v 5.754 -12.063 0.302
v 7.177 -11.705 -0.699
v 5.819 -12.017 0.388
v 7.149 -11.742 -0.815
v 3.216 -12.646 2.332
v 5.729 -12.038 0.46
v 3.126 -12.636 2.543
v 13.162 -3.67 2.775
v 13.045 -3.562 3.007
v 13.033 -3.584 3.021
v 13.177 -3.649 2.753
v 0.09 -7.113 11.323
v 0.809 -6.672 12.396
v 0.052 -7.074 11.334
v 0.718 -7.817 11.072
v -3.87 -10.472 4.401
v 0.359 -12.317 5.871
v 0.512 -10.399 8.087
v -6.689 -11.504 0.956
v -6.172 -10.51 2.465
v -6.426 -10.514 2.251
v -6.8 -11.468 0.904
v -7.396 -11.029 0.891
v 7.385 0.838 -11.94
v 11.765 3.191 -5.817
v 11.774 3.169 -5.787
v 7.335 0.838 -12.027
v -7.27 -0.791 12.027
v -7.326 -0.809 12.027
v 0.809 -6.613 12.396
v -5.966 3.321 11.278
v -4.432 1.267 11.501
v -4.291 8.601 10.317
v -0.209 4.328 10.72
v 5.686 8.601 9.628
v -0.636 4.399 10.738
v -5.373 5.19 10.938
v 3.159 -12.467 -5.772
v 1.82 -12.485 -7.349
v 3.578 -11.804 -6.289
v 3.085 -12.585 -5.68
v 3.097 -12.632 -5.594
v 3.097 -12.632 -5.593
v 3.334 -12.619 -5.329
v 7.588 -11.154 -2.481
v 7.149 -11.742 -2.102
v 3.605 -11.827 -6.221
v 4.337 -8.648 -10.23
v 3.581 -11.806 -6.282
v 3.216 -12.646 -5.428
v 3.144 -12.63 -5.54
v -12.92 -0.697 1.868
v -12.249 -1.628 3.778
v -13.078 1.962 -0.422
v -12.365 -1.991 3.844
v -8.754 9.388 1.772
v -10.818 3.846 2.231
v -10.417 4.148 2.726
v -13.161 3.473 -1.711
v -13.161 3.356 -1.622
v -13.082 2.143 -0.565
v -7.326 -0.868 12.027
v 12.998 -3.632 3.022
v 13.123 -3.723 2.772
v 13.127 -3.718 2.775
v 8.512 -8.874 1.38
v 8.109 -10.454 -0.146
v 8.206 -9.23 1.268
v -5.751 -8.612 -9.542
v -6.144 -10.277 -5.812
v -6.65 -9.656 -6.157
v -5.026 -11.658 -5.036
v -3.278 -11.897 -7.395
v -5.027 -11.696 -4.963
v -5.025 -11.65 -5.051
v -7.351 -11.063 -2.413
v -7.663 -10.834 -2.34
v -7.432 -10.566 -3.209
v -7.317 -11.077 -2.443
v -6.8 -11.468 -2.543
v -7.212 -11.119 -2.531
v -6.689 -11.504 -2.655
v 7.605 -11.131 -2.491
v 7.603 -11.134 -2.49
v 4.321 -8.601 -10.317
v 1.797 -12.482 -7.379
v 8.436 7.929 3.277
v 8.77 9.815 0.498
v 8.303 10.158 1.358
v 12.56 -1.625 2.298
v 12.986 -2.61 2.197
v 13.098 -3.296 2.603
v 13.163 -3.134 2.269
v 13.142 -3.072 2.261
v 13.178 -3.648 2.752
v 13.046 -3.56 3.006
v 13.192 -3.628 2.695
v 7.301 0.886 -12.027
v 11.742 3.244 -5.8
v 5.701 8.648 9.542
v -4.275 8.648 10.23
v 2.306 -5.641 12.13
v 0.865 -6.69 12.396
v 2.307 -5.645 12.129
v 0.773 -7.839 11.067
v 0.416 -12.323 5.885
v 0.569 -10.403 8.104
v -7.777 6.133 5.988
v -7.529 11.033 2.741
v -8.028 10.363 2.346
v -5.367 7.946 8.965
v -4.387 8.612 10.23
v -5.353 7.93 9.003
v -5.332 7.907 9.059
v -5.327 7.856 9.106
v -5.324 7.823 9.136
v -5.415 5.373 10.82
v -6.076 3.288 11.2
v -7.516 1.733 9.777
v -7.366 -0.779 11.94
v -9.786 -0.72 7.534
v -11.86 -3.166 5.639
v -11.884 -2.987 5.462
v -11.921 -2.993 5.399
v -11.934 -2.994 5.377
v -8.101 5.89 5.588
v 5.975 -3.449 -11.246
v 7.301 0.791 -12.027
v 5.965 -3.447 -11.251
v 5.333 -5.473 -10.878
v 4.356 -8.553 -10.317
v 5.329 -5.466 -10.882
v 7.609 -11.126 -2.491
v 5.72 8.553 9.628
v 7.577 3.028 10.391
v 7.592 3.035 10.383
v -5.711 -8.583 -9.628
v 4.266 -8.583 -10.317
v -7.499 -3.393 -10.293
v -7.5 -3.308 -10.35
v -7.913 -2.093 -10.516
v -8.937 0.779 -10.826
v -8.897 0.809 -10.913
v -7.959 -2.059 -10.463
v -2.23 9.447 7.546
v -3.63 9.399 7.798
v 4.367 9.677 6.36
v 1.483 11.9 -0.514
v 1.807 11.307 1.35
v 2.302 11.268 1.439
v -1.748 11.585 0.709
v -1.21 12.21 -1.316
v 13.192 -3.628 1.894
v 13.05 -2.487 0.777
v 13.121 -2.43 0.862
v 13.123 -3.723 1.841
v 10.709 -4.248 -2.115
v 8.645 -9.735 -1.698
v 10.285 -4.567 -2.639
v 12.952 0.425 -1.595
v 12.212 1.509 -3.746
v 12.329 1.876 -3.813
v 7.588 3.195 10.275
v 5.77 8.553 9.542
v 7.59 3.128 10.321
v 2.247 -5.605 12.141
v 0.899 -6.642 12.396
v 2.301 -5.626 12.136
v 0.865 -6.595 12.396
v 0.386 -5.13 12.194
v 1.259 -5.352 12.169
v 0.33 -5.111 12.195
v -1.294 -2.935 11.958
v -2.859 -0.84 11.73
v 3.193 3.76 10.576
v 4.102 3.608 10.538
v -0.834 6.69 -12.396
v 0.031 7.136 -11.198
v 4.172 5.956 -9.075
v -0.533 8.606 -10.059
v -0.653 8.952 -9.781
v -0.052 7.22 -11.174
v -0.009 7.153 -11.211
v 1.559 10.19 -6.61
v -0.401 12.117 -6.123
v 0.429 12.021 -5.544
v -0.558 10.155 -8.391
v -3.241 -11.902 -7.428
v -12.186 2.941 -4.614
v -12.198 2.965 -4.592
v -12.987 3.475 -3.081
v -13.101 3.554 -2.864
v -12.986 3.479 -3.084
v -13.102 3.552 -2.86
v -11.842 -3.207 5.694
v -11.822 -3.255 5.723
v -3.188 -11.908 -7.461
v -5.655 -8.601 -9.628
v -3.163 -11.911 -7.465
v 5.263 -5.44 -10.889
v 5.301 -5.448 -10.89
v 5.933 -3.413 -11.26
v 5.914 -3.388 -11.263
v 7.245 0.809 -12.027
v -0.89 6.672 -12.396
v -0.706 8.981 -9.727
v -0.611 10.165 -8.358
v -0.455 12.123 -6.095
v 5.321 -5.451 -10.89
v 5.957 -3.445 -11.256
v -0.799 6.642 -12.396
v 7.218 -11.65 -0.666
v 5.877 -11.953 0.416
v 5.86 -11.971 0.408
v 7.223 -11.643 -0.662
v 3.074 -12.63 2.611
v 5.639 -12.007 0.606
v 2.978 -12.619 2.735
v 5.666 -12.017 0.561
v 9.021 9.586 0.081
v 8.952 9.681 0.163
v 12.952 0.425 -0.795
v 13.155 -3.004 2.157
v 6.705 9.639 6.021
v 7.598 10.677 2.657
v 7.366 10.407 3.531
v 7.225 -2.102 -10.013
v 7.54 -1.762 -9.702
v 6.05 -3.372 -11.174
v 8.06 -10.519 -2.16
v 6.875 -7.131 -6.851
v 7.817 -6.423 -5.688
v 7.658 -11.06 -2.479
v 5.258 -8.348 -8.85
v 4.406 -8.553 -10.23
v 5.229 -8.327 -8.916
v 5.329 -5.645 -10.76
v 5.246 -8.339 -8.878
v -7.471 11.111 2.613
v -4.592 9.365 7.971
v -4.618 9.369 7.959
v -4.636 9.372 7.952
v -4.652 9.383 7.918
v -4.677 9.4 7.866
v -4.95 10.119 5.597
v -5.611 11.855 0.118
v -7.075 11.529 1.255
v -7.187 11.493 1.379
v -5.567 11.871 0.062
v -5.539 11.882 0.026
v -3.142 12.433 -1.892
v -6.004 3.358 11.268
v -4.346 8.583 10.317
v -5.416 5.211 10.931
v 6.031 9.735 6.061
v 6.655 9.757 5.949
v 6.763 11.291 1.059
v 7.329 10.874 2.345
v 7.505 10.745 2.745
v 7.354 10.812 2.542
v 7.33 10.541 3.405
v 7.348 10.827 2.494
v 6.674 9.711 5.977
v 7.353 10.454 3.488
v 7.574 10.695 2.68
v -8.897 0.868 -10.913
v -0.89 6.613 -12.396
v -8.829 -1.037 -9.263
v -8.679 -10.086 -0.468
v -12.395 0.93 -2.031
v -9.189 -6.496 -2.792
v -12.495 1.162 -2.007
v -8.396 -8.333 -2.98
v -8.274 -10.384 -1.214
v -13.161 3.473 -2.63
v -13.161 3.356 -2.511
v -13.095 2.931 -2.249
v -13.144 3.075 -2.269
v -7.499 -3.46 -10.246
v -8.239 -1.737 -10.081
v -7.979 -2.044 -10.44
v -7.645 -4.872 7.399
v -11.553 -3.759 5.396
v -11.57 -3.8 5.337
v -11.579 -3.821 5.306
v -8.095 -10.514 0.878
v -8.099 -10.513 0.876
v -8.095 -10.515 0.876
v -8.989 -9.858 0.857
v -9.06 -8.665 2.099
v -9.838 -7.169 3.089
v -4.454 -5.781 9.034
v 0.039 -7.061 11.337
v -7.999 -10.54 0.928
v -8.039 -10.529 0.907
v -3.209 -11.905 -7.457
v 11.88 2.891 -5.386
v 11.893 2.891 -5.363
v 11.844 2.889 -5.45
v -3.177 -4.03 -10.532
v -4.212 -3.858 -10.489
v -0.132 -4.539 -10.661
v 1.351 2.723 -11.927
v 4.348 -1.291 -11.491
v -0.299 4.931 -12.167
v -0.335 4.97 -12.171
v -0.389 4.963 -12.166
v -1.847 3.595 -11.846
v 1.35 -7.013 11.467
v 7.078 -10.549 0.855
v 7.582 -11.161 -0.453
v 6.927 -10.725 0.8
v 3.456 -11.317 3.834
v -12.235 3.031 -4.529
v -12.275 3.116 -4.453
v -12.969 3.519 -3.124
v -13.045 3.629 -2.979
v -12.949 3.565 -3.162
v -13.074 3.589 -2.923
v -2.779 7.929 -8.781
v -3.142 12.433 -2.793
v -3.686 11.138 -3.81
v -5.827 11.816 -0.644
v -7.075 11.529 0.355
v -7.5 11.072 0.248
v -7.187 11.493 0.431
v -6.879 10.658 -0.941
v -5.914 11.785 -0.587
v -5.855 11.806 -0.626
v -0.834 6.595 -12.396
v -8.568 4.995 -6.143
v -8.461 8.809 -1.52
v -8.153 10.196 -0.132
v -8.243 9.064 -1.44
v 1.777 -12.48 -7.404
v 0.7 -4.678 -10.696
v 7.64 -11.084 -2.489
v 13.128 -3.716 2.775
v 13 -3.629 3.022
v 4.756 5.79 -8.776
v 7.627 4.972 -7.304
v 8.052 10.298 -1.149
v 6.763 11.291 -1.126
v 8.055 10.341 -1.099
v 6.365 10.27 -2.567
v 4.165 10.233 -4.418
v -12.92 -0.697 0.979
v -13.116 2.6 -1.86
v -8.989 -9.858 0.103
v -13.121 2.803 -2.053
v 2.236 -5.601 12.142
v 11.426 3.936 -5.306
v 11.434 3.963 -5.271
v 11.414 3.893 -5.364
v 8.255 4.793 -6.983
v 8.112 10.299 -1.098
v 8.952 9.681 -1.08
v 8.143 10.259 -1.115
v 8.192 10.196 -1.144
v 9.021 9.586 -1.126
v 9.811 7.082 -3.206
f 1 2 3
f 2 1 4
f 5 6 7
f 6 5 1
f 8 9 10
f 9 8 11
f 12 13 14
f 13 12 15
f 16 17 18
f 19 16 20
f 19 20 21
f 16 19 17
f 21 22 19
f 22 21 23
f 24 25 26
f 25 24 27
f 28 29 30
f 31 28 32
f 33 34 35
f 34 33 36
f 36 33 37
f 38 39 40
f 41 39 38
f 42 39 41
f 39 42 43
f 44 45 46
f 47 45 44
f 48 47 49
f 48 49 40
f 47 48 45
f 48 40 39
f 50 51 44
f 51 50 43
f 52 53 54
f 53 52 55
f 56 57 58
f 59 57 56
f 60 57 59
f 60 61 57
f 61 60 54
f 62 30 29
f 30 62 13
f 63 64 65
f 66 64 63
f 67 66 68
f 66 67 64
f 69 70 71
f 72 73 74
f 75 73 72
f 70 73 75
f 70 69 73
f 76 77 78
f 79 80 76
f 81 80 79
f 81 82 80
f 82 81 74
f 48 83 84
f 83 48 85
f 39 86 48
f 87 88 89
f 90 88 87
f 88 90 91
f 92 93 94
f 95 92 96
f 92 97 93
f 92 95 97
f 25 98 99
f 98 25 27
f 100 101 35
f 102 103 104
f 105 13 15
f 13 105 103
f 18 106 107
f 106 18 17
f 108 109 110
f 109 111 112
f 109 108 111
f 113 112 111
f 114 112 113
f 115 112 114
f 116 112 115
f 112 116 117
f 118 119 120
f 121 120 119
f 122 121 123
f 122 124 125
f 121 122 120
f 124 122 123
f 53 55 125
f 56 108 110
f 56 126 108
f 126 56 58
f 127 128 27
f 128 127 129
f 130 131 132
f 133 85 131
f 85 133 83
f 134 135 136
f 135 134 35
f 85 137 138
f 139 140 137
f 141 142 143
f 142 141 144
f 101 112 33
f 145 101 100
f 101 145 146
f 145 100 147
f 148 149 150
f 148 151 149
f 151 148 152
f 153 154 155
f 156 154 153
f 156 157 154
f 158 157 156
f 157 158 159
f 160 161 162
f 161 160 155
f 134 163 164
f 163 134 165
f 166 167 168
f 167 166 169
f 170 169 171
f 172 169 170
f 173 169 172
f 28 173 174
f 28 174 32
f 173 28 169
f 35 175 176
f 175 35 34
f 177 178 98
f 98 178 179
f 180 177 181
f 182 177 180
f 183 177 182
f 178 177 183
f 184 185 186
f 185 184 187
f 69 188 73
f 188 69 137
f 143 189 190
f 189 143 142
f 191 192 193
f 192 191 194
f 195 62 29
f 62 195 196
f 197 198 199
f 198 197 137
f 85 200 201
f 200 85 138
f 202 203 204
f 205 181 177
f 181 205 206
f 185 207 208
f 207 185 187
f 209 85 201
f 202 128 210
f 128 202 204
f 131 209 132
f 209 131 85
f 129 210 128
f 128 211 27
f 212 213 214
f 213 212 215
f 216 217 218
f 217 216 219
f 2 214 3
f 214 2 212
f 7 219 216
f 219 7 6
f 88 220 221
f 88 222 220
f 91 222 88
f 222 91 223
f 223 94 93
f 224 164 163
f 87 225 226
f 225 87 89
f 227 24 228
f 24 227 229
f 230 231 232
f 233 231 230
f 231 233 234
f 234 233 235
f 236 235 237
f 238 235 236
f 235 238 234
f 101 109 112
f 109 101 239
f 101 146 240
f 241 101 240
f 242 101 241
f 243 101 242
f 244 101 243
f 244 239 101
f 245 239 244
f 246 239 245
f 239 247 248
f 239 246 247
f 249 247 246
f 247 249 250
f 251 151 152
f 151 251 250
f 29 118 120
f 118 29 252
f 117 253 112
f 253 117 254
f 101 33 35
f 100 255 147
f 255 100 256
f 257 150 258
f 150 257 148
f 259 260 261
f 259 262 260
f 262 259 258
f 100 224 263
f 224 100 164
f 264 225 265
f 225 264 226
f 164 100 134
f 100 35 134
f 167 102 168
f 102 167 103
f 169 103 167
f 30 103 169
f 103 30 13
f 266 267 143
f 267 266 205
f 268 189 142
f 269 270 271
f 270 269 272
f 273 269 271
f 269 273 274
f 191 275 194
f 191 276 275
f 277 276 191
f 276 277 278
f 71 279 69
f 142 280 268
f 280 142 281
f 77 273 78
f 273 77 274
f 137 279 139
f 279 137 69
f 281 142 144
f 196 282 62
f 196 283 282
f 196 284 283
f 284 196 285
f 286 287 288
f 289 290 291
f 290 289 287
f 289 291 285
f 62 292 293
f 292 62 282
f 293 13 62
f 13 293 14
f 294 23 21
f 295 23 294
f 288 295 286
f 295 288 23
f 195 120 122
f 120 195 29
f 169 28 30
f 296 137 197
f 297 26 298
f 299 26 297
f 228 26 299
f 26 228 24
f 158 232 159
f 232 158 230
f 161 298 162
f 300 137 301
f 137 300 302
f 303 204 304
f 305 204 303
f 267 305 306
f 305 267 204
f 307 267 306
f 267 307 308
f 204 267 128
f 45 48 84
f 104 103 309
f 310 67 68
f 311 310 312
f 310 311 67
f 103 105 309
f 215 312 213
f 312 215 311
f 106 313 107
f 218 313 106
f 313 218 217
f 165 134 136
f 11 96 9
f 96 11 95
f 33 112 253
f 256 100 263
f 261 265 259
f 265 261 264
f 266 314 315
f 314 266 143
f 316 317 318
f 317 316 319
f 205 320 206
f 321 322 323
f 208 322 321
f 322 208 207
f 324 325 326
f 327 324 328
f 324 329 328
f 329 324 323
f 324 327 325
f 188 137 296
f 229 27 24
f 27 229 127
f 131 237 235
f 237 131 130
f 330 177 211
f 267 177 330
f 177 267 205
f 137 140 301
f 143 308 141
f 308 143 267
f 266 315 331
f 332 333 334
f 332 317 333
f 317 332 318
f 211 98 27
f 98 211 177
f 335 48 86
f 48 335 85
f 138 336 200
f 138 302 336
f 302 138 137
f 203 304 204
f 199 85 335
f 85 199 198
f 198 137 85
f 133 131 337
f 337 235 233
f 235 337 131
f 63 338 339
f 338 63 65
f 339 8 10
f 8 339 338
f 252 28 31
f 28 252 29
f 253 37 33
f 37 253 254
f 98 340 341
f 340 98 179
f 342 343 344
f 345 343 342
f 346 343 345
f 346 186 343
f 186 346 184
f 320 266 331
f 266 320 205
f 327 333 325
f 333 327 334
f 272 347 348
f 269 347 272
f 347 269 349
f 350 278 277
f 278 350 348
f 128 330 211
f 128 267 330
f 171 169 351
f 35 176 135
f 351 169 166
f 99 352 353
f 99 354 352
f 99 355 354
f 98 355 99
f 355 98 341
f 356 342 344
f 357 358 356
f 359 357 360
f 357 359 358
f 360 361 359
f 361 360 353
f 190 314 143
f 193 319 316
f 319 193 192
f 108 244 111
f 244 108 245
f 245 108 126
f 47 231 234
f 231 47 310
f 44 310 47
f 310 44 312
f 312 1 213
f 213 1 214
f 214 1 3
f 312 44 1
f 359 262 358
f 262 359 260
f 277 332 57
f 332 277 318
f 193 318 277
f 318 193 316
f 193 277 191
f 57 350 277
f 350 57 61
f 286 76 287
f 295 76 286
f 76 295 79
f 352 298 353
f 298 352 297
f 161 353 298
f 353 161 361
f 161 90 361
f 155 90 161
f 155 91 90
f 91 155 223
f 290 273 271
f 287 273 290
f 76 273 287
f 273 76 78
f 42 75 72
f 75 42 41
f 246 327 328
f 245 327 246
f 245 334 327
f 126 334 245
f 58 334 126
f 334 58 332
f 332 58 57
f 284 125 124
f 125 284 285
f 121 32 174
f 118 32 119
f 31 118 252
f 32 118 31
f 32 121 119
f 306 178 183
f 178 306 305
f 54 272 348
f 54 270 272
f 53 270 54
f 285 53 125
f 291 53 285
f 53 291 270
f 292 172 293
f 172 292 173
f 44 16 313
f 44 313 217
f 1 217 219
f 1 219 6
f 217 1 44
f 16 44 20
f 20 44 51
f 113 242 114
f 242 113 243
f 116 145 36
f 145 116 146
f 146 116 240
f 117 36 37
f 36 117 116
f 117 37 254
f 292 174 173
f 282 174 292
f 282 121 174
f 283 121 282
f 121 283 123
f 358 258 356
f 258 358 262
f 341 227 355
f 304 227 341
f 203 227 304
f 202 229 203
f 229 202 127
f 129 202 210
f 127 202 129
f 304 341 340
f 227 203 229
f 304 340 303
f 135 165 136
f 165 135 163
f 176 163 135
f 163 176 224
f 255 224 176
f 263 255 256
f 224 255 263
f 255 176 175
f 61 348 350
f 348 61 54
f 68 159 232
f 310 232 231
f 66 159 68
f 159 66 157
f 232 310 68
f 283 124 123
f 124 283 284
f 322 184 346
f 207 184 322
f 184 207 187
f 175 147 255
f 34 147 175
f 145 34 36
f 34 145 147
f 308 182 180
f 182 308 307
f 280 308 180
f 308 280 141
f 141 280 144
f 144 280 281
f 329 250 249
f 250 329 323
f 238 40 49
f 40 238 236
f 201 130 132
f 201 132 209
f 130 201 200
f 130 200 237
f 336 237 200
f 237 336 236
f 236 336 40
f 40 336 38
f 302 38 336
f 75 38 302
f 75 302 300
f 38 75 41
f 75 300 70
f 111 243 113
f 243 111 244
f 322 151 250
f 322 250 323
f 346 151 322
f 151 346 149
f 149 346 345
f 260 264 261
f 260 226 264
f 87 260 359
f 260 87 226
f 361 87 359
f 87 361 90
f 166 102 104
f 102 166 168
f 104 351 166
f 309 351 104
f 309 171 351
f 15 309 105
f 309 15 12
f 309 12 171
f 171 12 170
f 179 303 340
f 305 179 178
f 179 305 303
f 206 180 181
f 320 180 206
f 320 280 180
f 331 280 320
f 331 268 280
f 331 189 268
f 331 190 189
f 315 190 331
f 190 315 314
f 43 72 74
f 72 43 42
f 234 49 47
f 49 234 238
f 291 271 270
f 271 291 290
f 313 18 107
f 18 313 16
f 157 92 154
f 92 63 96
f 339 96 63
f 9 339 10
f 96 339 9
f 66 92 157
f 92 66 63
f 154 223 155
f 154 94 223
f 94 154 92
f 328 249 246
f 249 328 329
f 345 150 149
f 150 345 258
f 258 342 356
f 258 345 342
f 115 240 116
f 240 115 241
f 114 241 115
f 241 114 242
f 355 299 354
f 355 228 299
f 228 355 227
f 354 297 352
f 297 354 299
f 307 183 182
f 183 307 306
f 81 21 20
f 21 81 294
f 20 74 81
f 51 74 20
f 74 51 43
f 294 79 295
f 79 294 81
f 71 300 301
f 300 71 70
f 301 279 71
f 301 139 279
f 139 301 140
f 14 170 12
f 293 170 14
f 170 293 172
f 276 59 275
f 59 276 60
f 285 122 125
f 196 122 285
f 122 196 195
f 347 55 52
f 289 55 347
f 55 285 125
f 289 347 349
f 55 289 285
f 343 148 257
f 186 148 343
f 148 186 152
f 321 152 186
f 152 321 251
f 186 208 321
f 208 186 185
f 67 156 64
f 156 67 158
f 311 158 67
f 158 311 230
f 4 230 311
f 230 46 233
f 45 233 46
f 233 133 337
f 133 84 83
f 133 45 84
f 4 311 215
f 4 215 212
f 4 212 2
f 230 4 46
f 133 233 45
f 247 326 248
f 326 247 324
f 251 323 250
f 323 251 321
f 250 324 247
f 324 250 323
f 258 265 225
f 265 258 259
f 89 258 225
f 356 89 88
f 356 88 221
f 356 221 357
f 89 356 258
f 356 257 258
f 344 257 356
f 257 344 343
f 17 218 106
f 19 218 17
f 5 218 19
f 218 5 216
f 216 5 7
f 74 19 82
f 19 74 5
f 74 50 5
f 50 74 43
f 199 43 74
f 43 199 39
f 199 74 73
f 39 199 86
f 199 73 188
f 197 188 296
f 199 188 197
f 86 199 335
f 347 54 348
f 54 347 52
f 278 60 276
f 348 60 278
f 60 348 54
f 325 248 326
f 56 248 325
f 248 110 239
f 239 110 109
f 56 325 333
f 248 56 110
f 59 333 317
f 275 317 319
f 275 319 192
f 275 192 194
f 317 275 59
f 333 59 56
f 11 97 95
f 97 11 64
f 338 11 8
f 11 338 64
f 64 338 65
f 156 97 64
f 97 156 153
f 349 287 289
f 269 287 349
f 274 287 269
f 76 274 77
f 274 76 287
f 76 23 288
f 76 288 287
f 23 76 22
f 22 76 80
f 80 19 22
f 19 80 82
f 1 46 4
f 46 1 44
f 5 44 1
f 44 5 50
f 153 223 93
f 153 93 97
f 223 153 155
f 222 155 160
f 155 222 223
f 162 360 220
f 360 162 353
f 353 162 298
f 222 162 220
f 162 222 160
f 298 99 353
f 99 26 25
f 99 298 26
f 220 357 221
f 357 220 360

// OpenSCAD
// Auto-generated OpenSCAD file

    inner_points = 10*[[0.0998930354475761, -0.08761839771919257, 1.3956184279718415], [0.6728697039772034, -0.5090233371692008, -1.1239485150914914], [-0.6716026362296299, 0.487698807845633, 1.1239485150914914], [-0.0986259677000027, 0.06629386839562477, -1.3956184279718415], [-0.8908119004872508, -0.979928839088502, 0.47892884316814505], [-0.6719542878696155, -1.1408912029313139, -0.48346009215137703], [0.673221355617189, 1.1195666736077459, 0.48346009215137703], [0.8920789682348242, 0.9586043097649343, -0.47892884316814505], [0.7118307070376008, -1.1647302272134858, 0.35475514127068664], [-1.3079711835867545, 0.3414697712678377, -0.35648592437079285], [1.3092382513343277, -0.36279430059140544, 0.35648592437079285], [-0.7105636392900273, 1.1434056978899179, -0.35475514127068664], [-0.035585740512491165, -0.9946621663535183, 0.9969743473109073], [0.3185333153995008, -1.2551047419607149, -0.5602036604329037], [-1.28389195945964, -0.06377937343702057, 0.5574031945497779], [-0.9297729035476481, -0.3242219490442169, -0.999774813194033], [0.9310399712952215, 0.30289741972064915, 0.999774813194033], [1.2851590272072133, 0.04245484411345278, -0.5574031945497779], [-0.31726624765192735, 1.2337802126371469, 0.5602036604329037], [0.03685280826006457, 0.9733376370299506, -0.9969743473109073], [0.8878158417756826, -0.674182307300777, 1.208213968994985]];

    outer_points = 10*[[0.03282366802055475, -1.3176403726430708, 0.4756805091246931], [-0.08493614308928757, 0.6642367211098263, -1.2308943583788188], [0.08493614308928757, -0.6642367211098263, 1.2308943583788188], [-0.03282366802055475, 1.3176403726430708, -0.4756805091246931], [-1.283421516714085, -0.3785048441443724, 0.4160394031302599], [-1.3284017620492774, 0.3785048441443724, -0.2358141919097333], [1.3284017620492774, -0.3785048441443724, 0.2358141919097333], [1.283421516714085, 0.3785048441443724, -0.4160394031302599], [-0.5670299754236185, -0.8553164840436631, -0.9541678105326641], [-0.43059774445579446, 0.8553164840436631, 1.0230077155892763], [0.43059774445579446, -0.8553164840436631, -1.0230077155892763], [0.5670299754236185, 0.8553164840436631, 0.9541678105326641], [-0.8128678745041953, -1.141048361009117, -0.027927549120190846], [-0.8856474402788453, 0.0838190444550353, -1.0826488215837096], [-0.728548118605104, -0.0838190444550353, 1.194034127747624], [-0.8013276843797541, 1.141048361009117, 0.1393128552841052], [0.8013276843797541, -1.141048361009117, -0.1393128552841052], [0.728548118605104, 0.0838190444550353, -1.194034127747624], [0.8856474402788453, -0.0838190444550353, 1.0826488215837096], [0.8128678745041953, 1.141048361009117, 0.027927549120190846], [-0.033902923914046645, -1.5635173407451266, -0.4913210826453173]];

    // Convex hull for inner set (I)
    module inner_hull() {
        hull() {
            for (p = inner_points) {
                translate(p) sphere(r=0.1);
            }
        }
    }

    // Convex hull for outer set (O) minus inner hull (O \ I)
    module outer_minus_inner() {
        difference() {
            hull() {
                for (p = outer_points) {
                    translate(p) sphere(r=0.1);
                }
            }
            inner_hull(); // Subtract inner hull
        }
    }

    // Convex hull for outer set (O) minus all translated inner hulls
    module outer_minus_AllTranslationInner() {
        difference() {
            hull() {
                for (p = outer_points) {
                    translate(p) sphere(r=0.1);
                }
            }
            hull() {
                translate([0,0,50]) inner_hull();
                translate([0,0,-50]) inner_hull();
            }; // Subtract translated inner hulls
        }
    }

    // Difference between outer_minus_inner and outer_minus_AllTranslationInner
    module outer_minus_inner_diff() {
        difference() {
            // Outer minus inner
            difference() {
                hull() {
                    for (p = outer_points) {
                        translate(p) sphere(r=0.1);
                    }
                }
                inner_hull();
            }

            // Subtract Outer minus AllTranslationInner
            difference() {
                hull() {
                    for (p = outer_points) {
                        translate(p) sphere(r=0.1);
                    }
                }
                hull() {
                    translate([0,0,50]) inner_hull();
                    translate([0,0,-50]) inner_hull();
                };
            }
        }
    }

    // Rendering all with colors applied
    color([1, 1, 0, 1]) outer_minus_inner_diff(); // Opaque yellow
    
